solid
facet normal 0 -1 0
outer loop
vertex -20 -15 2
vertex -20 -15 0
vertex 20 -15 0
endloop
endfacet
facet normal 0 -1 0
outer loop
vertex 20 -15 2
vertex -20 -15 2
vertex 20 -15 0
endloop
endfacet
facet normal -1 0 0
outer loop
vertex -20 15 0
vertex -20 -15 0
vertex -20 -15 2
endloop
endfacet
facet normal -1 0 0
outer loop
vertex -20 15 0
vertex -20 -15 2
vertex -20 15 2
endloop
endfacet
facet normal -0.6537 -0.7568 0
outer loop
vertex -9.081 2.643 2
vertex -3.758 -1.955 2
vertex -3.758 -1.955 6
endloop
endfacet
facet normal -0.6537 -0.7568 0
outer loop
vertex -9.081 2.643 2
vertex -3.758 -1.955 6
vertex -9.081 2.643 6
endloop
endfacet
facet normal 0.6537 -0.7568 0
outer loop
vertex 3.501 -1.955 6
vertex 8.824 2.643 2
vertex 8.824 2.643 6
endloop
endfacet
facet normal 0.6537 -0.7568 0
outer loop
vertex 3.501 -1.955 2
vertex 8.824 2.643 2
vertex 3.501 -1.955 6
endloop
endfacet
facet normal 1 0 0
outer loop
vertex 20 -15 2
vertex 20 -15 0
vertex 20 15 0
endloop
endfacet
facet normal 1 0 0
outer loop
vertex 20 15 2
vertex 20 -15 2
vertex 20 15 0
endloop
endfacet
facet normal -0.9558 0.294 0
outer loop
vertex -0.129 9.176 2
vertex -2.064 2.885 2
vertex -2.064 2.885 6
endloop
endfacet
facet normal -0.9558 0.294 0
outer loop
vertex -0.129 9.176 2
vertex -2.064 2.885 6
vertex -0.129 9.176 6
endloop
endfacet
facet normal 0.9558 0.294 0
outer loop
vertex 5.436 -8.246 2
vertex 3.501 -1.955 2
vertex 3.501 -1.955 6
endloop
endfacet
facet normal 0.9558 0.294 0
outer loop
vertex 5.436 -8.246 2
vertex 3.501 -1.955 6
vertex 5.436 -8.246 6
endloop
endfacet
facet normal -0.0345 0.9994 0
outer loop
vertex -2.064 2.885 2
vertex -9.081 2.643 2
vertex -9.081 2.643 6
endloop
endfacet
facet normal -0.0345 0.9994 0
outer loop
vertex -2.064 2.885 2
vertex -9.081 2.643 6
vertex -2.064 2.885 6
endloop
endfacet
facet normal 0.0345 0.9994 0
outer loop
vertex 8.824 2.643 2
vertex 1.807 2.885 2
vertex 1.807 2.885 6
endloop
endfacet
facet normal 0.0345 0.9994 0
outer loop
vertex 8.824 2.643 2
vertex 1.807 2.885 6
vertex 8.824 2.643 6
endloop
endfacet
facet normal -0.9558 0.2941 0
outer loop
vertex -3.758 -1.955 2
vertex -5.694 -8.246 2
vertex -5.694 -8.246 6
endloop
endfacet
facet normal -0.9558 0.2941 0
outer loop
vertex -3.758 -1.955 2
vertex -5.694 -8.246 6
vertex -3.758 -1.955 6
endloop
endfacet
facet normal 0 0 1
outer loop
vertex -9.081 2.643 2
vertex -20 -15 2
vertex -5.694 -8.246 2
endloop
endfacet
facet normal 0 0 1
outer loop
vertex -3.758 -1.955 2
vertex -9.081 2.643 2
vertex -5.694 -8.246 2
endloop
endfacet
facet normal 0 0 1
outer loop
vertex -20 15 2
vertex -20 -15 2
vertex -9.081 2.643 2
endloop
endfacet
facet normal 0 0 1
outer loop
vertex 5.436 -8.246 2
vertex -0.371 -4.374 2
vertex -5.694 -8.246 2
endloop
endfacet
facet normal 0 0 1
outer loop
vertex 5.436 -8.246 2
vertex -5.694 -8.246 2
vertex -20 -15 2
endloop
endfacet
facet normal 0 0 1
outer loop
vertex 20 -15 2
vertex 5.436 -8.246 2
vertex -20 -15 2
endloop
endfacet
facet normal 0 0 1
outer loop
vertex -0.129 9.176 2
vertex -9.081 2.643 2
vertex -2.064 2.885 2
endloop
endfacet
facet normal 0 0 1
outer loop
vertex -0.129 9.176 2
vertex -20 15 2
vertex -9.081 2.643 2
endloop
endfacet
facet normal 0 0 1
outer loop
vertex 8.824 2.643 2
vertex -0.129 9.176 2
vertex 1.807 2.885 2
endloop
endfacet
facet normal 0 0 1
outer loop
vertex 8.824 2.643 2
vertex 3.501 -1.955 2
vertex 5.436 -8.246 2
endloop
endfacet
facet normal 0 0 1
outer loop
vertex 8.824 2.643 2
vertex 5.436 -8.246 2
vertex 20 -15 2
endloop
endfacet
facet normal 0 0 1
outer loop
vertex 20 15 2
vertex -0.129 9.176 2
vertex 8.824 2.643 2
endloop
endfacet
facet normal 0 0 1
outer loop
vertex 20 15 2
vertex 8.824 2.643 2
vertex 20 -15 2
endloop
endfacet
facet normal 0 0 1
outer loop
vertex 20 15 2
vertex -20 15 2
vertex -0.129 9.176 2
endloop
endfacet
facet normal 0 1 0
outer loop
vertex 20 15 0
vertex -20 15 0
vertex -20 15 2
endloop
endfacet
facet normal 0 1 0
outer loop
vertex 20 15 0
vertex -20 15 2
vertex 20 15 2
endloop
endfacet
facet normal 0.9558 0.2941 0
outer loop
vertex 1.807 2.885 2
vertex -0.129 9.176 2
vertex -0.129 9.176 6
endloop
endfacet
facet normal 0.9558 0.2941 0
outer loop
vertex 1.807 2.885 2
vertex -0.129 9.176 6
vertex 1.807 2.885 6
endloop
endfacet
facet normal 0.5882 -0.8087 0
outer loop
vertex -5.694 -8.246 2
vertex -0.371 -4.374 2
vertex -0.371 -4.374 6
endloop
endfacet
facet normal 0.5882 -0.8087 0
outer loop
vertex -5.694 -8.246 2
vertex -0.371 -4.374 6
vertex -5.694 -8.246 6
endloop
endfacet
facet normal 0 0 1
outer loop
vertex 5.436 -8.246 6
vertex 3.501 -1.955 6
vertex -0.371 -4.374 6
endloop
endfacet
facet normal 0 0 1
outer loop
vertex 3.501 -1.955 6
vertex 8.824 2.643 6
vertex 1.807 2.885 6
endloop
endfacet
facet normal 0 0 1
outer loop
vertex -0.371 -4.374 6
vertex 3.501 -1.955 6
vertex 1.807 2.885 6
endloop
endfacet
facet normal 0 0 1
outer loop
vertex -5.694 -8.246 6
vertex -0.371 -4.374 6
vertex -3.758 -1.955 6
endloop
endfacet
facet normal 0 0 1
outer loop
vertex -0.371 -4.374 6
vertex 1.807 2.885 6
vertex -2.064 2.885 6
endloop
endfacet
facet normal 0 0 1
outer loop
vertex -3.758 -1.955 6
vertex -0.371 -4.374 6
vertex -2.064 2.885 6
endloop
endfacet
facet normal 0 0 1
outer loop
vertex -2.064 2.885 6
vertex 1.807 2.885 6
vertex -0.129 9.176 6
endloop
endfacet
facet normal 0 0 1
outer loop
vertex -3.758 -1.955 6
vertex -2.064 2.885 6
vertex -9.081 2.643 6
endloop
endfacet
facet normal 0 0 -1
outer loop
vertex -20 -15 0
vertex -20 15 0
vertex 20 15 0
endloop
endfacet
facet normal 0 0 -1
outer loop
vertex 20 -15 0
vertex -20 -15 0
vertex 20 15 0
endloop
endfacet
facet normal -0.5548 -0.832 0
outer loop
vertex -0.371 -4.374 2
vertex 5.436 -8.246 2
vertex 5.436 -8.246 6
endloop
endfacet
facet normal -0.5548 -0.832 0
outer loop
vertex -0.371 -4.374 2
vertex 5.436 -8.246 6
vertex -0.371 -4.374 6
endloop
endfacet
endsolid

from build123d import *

# Parameters (mm, degrees)
SKETCH1_W           = 40
SKETCH1_H           = 30
BOSS_EXTRUDE1_DEPTH = 2
BOSS_EXTRUDE2_DEPTH = 4


with BuildPart() as part:
    # Sketch1 → Boss-Extrude1 (new body)
    with BuildSketch(Plane.XY):
        Rectangle(SKETCH1_W, SKETCH1_H)
    extrude(amount=BOSS_EXTRUDE1_DEPTH)

    # Sketch2 → Boss-Extrude2 (add)
    with BuildSketch(Plane.XY.offset(2)):
        Polygon((-0.128668655, 9.175508535), (1.807002834, 2.884576195), (8.823811983, 2.642617259), (3.500715387, -1.954602529), (5.436386876, -8.245534869), (-0.370627592, -4.37419189), (-5.693724187, -8.245534869), (-3.758052698, -1.954602529), (-9.081149293, 2.642617259), (-2.064340145, 2.884576195), align=None)
    extrude(amount=BOSS_EXTRUDE2_DEPTH)


solid = part.part
